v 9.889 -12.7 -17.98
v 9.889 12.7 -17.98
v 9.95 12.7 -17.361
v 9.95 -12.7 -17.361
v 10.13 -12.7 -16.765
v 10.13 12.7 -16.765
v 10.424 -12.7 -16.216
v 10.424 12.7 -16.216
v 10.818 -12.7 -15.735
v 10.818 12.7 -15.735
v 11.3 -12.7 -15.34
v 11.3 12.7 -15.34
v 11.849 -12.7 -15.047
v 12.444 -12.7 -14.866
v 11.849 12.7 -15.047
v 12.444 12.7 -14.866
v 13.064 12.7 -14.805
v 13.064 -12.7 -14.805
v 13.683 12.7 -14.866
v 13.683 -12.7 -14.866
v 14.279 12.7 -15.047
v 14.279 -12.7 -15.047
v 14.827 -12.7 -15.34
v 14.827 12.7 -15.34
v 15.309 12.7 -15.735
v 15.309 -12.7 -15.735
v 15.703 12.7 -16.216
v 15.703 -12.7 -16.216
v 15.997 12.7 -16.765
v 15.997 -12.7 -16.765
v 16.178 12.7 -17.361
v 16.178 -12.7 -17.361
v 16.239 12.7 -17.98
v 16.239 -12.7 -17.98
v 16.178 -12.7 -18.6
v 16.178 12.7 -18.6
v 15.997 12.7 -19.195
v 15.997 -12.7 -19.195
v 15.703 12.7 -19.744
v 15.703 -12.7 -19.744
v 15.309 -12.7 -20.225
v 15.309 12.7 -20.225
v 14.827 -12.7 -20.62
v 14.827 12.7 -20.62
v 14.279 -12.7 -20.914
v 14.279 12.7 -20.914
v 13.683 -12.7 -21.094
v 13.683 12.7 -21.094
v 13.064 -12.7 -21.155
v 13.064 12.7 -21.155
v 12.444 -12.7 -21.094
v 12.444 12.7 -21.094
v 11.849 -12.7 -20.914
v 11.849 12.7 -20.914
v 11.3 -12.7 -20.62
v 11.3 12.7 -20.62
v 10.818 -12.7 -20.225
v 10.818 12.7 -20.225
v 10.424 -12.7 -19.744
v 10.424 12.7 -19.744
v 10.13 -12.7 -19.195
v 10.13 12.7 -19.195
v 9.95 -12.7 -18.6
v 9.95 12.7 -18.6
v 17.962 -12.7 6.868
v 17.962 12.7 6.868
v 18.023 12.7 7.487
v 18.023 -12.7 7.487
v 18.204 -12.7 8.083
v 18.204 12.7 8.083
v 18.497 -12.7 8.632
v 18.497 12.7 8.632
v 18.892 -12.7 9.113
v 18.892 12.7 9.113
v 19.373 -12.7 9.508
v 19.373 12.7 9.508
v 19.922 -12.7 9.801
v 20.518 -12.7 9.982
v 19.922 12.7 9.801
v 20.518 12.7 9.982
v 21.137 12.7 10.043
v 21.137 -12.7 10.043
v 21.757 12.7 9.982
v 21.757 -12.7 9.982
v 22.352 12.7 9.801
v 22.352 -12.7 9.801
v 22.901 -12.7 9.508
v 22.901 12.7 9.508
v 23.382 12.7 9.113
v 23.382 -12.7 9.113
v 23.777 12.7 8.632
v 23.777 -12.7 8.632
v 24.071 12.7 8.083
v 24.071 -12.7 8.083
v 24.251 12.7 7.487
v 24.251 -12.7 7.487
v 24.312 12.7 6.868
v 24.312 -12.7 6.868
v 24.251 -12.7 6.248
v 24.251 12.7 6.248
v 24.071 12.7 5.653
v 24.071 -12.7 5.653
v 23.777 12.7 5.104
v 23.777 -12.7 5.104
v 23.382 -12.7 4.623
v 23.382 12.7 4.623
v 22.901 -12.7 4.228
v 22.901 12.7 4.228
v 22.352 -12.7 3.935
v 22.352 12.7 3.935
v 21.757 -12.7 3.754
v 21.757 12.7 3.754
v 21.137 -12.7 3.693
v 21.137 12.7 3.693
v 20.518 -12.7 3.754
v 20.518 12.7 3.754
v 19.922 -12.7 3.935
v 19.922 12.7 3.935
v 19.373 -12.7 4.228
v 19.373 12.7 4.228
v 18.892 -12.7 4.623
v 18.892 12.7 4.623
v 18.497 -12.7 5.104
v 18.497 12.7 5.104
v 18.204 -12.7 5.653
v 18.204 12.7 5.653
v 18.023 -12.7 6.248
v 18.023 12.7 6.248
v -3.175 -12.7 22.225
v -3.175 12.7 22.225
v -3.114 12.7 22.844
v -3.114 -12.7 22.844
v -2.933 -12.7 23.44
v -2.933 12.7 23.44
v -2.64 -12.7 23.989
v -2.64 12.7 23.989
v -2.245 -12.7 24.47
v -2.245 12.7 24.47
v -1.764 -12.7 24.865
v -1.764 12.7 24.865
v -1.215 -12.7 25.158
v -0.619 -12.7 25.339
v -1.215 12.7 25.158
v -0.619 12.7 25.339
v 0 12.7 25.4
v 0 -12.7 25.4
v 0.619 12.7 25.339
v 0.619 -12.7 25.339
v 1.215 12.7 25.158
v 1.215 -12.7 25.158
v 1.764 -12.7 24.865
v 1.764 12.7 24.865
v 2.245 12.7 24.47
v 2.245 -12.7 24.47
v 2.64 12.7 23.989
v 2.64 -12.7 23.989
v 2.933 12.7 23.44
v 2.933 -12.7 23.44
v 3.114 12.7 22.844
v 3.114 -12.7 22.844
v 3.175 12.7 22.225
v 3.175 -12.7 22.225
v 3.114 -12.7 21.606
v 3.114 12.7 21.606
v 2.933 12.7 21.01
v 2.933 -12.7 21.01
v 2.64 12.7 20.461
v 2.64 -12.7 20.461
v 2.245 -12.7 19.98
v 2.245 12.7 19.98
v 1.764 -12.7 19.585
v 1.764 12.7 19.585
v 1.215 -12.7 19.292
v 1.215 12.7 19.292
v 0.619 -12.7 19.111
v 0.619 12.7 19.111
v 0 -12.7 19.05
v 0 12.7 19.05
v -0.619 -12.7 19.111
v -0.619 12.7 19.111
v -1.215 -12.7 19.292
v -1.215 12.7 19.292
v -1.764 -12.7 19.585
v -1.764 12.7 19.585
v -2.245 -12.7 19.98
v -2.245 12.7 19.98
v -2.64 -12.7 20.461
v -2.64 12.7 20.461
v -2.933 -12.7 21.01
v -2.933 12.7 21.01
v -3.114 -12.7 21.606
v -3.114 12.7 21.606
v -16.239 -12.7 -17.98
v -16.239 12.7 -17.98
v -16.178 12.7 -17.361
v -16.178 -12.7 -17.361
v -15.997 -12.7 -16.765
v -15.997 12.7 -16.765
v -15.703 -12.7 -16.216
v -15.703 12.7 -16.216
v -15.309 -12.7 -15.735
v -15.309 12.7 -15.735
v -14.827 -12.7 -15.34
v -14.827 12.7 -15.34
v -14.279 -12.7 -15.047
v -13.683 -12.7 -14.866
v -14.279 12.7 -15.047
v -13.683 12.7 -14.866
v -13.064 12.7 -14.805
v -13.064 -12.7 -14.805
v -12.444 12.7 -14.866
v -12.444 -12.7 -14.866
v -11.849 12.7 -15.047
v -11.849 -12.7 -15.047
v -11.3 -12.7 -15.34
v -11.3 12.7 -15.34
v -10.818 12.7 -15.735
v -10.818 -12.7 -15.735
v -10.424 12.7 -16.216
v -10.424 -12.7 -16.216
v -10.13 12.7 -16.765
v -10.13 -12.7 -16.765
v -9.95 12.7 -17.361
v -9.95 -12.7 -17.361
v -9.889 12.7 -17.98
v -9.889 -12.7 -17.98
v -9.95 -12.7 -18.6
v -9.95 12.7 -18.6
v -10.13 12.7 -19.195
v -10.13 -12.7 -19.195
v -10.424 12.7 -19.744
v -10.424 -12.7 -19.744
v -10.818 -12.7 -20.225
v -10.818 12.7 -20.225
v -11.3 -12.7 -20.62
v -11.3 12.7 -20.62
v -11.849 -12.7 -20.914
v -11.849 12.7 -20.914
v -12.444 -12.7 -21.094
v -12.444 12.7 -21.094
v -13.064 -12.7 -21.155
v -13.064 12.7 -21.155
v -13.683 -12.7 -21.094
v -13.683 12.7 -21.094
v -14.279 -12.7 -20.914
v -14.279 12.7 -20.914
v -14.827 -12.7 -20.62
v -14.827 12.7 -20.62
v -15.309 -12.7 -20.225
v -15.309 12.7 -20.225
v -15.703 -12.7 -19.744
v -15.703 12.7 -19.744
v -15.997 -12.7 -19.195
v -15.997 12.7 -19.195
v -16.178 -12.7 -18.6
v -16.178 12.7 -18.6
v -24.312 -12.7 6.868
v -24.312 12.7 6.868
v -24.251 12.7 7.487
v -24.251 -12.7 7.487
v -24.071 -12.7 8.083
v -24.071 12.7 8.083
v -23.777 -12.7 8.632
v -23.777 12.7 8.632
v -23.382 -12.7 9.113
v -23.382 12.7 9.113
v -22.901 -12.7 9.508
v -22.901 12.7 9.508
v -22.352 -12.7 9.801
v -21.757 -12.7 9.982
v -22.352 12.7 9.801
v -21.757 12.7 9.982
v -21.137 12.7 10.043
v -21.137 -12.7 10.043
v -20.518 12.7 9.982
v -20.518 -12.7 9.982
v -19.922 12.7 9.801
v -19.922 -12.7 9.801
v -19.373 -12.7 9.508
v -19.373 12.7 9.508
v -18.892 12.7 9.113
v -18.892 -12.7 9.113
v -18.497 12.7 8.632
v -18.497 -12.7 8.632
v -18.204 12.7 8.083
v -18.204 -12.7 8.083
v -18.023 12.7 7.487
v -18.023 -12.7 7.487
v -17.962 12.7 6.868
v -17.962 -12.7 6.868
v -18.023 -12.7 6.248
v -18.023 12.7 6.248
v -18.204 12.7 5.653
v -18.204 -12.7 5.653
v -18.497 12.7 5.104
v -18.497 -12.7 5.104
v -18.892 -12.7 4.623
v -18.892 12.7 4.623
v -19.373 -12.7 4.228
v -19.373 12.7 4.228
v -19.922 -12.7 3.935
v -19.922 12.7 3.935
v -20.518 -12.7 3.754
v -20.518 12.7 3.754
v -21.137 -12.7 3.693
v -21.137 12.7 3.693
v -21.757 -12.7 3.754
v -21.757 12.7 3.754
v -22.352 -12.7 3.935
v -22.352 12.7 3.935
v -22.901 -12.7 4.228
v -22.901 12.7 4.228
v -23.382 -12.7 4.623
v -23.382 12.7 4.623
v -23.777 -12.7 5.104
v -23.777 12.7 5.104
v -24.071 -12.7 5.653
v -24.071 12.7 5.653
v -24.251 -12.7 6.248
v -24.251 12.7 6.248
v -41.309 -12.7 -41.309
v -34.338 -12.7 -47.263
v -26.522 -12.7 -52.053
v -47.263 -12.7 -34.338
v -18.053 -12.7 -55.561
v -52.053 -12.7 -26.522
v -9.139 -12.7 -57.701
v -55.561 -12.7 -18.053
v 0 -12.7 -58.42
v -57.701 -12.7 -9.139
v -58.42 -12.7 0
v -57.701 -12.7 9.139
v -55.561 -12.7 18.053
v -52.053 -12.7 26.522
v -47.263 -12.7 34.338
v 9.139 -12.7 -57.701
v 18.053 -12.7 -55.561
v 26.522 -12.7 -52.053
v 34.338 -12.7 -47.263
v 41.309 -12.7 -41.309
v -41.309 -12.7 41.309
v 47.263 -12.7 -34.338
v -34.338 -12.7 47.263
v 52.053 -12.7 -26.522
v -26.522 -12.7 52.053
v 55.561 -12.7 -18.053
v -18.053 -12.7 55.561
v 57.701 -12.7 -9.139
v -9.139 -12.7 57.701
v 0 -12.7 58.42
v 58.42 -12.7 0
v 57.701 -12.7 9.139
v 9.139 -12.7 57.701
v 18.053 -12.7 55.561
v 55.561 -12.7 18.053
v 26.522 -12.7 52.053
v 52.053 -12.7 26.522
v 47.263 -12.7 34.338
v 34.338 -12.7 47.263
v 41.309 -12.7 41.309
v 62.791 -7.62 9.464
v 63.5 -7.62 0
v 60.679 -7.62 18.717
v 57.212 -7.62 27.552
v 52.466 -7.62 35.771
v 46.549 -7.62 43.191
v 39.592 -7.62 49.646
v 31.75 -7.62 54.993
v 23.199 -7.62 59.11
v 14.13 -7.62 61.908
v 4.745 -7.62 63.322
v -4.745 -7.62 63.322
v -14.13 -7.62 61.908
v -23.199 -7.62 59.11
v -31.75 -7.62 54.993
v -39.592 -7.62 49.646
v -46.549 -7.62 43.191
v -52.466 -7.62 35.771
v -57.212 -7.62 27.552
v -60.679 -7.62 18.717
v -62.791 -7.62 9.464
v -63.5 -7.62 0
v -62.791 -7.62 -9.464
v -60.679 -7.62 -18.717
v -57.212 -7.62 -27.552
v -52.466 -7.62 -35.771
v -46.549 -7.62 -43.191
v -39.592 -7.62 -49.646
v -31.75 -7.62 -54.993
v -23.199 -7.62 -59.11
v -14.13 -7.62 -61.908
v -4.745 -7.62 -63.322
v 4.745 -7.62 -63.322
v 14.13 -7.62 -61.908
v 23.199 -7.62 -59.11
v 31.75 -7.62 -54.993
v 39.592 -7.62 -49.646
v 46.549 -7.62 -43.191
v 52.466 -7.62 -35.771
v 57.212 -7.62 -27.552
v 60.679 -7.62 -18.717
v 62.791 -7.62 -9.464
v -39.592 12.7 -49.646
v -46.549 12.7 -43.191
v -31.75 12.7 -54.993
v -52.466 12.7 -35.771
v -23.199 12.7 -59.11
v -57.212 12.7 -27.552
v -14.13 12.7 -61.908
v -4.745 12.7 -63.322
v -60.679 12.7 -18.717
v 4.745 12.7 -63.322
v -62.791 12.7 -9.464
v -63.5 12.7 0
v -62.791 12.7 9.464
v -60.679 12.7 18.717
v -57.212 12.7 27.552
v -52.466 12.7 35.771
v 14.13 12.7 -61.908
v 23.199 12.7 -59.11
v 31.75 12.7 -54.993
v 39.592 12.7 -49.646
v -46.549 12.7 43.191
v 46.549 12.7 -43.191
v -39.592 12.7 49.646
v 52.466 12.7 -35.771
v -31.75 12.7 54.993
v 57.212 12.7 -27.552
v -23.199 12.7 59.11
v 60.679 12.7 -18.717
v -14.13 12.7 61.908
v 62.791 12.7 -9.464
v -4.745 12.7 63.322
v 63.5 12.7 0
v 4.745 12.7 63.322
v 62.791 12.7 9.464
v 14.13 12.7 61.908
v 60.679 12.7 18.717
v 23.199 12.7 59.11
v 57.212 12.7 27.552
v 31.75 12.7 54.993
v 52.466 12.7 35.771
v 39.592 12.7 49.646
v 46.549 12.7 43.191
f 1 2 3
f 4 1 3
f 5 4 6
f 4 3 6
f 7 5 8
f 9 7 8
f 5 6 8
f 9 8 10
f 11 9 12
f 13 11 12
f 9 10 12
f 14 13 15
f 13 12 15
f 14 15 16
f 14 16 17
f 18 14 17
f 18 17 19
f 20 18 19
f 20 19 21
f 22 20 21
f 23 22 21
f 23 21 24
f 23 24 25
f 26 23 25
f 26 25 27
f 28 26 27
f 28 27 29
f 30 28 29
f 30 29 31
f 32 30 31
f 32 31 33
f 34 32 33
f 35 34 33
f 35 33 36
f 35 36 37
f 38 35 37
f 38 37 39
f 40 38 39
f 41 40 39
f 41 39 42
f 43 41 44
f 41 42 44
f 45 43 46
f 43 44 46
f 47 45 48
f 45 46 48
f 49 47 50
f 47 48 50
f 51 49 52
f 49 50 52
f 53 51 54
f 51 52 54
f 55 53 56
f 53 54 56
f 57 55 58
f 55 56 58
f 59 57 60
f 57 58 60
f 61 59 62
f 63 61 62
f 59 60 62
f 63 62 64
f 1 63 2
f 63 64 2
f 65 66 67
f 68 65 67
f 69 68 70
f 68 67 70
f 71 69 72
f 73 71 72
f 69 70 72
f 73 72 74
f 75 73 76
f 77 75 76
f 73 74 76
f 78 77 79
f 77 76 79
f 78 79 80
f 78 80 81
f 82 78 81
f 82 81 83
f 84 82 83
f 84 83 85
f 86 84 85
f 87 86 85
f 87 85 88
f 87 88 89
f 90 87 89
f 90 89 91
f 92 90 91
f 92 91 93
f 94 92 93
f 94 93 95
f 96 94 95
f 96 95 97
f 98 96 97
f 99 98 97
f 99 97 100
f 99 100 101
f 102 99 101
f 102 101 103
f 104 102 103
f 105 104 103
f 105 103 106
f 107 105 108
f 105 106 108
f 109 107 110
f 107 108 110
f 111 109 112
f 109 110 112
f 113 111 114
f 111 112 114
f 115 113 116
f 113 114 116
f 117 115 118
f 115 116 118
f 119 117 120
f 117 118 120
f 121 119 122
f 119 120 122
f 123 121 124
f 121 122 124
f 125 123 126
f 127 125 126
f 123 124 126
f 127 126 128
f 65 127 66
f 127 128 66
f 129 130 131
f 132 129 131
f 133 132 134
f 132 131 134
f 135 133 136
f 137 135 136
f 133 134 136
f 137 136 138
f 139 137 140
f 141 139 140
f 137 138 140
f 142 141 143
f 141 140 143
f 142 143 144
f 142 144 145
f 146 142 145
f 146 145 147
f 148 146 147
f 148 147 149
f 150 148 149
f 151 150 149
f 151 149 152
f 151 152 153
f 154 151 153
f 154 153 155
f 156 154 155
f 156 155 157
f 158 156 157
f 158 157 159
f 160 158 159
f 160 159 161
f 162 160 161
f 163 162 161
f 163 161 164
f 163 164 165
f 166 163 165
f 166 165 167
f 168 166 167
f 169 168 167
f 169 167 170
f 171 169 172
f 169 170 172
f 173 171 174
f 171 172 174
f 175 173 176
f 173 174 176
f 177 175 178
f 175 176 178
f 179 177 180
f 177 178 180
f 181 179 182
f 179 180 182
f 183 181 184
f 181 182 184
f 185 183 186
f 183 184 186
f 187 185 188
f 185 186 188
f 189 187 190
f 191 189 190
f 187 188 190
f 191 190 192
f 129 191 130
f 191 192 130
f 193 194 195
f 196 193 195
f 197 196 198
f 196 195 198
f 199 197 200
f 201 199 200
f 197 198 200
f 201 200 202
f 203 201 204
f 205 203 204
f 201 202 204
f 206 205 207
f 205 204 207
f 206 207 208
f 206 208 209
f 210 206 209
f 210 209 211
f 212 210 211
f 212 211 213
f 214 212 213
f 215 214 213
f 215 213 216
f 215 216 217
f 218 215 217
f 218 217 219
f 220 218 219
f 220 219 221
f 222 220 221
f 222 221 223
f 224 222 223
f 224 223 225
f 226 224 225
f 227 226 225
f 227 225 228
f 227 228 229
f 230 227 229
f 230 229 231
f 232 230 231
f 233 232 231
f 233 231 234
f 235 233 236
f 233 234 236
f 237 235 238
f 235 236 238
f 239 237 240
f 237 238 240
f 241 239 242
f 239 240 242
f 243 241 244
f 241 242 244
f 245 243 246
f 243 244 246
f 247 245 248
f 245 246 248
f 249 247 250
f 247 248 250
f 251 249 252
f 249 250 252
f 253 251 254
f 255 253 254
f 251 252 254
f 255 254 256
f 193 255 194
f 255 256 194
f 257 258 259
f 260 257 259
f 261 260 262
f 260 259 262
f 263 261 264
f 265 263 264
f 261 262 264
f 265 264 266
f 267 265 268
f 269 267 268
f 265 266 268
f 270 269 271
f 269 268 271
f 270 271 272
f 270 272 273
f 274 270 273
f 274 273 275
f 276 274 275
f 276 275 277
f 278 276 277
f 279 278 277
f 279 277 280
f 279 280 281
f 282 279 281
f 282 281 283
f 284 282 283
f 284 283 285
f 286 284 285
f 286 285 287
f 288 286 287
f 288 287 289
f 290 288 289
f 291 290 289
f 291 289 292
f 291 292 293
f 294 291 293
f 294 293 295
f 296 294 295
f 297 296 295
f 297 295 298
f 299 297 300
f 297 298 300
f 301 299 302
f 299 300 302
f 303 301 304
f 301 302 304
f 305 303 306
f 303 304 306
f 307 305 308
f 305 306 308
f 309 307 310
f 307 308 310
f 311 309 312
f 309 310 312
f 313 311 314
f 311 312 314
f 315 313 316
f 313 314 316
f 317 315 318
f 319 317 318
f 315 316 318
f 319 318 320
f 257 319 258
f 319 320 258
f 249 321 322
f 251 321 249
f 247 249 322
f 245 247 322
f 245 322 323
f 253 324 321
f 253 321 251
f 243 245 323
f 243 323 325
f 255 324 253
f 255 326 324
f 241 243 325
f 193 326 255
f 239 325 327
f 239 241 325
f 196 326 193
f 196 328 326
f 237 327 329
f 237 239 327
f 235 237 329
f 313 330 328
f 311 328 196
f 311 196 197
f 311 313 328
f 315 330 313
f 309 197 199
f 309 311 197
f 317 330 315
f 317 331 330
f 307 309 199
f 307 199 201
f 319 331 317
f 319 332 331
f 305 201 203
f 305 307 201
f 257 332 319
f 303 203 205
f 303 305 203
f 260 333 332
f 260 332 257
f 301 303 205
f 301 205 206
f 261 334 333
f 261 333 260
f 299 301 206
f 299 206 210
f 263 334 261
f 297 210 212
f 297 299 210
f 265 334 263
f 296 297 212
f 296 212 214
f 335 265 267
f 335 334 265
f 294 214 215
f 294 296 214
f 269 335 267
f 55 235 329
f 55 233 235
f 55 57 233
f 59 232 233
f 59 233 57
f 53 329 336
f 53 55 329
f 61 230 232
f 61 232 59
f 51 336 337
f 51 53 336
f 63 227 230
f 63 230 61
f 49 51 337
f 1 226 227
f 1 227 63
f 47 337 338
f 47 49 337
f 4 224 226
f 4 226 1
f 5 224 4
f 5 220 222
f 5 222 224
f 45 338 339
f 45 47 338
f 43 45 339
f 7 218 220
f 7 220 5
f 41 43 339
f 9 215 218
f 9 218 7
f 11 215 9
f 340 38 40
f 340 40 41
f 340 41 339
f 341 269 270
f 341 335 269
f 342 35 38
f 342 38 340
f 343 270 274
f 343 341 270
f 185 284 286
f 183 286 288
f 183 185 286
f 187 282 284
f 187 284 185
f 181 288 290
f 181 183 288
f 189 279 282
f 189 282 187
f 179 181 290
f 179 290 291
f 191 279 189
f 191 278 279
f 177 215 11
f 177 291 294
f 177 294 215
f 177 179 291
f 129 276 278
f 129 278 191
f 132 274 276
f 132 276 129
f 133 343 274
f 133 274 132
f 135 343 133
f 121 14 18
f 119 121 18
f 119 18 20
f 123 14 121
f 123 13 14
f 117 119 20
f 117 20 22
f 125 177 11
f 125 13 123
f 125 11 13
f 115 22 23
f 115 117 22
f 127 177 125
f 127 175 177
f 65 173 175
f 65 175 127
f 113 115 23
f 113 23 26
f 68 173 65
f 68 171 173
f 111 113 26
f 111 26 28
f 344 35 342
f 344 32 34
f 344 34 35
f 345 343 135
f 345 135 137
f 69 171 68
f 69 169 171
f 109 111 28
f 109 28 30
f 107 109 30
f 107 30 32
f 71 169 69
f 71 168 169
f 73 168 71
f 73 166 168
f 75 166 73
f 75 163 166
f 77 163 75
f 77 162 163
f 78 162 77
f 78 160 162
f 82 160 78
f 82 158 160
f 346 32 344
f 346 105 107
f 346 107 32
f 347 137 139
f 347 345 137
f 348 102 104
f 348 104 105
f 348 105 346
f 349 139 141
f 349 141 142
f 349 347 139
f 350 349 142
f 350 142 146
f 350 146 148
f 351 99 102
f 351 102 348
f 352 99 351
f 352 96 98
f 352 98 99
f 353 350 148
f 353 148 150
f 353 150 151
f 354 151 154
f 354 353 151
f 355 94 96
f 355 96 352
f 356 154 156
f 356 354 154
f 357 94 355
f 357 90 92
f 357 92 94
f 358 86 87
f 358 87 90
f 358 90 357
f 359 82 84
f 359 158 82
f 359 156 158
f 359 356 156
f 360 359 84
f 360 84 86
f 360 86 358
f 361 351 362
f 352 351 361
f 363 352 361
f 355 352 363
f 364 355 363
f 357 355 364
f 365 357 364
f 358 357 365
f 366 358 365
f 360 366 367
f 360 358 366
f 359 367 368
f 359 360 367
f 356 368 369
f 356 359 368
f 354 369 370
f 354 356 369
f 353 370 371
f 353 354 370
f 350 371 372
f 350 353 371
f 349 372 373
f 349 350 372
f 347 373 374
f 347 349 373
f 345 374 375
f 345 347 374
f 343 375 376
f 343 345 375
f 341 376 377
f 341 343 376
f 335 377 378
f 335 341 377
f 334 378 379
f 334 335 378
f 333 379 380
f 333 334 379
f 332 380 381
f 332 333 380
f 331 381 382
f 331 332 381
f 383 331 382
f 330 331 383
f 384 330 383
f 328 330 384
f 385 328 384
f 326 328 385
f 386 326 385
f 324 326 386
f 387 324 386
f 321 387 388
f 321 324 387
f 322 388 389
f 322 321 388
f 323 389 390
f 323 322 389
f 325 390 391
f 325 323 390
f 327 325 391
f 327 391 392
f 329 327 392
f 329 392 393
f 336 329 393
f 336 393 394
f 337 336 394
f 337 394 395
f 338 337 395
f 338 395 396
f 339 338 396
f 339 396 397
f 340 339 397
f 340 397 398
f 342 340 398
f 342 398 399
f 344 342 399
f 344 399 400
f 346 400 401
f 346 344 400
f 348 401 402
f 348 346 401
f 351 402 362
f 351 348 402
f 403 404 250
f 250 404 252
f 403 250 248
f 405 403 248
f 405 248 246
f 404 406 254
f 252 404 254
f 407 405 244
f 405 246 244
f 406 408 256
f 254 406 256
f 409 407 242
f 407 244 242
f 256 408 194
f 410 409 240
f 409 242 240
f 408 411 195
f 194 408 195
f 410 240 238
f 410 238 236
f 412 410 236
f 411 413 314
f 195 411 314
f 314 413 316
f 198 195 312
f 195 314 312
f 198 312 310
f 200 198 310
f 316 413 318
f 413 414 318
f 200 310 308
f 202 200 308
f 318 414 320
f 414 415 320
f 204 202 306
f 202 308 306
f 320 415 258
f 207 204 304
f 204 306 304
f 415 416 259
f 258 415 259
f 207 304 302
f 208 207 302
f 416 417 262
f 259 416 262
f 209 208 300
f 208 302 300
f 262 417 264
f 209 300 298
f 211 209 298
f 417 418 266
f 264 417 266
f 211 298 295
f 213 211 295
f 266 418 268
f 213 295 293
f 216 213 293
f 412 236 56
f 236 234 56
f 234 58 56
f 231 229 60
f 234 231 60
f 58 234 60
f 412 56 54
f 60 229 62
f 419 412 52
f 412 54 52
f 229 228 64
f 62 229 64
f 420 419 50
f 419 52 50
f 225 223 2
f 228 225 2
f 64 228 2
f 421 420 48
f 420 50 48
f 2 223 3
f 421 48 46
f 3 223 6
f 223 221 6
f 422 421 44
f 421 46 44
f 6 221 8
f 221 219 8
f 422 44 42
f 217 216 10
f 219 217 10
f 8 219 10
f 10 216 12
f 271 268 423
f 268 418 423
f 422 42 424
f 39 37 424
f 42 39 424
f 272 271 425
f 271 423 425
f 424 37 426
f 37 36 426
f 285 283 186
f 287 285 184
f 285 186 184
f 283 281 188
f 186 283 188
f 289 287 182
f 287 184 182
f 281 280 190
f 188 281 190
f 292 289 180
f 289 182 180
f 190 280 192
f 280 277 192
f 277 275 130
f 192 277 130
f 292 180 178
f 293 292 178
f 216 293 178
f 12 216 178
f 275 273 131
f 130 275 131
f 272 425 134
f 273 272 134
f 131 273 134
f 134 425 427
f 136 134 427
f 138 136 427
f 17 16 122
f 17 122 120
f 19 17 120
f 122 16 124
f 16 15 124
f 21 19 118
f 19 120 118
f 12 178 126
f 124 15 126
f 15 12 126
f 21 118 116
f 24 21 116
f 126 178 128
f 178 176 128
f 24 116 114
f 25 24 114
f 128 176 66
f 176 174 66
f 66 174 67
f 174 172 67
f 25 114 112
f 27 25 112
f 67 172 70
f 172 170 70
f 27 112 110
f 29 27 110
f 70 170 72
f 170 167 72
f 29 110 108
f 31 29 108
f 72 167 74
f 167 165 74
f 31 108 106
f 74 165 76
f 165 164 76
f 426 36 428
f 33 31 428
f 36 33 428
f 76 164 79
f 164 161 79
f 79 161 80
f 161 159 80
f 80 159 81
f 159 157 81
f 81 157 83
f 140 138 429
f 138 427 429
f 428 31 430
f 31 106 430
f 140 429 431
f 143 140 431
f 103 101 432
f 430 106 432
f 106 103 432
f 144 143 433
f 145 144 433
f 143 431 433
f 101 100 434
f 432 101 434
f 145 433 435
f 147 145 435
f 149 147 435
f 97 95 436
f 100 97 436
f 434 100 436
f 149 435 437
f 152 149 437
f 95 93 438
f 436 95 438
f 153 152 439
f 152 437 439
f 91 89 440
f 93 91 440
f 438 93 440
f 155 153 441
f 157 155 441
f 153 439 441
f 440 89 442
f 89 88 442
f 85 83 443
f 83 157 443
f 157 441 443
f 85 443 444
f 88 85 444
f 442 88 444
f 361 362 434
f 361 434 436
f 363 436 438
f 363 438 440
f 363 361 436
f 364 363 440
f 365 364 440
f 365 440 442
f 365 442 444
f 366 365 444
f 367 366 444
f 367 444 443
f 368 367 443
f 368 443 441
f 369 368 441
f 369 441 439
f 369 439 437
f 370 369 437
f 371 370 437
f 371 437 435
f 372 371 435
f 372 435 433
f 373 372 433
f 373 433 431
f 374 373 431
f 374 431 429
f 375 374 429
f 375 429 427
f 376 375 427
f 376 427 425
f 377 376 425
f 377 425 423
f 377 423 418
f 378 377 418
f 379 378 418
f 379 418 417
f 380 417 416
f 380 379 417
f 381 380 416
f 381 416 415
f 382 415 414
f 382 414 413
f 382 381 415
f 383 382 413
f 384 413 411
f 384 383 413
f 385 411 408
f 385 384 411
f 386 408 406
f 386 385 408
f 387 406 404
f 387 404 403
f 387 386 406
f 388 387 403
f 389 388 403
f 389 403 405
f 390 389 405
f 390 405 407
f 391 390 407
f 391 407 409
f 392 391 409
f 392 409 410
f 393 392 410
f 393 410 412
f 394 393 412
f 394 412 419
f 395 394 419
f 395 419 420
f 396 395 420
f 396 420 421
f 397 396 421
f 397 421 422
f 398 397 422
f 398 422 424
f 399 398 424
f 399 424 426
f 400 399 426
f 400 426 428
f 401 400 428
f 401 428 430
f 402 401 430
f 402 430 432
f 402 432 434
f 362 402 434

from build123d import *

# Parameters (mm, degrees)
F0_R     = 63.5
F1_DEPTH = 12.7
F3_D     = 6.35
F4_SIZE  = 5.08


with BuildPart() as f1:
    # F0 (on Front) → F1 (new body, symmetric)
    with BuildSketch(Plane.XZ):
        Circle(F0_R)
    extrude(amount=F1_DEPTH, both=True)

    # F3 (through all)
    with Locations(Plane.XZ.offset(12.7)):
        with Locations((0, 22.225), (21.137231, 6.867903), (13.063527, -17.980403), (-13.063527, -17.980403), (-21.137231, 6.867903)):
            Hole(F3_D / 2)

    # F4
    f4_edges = [f1.edges().sort_by_distance(p)[0] for p in [
        (-63.5, -12.7, 0),
    ]]
    chamfer(f4_edges, length=F4_SIZE)


solid = f1.part
